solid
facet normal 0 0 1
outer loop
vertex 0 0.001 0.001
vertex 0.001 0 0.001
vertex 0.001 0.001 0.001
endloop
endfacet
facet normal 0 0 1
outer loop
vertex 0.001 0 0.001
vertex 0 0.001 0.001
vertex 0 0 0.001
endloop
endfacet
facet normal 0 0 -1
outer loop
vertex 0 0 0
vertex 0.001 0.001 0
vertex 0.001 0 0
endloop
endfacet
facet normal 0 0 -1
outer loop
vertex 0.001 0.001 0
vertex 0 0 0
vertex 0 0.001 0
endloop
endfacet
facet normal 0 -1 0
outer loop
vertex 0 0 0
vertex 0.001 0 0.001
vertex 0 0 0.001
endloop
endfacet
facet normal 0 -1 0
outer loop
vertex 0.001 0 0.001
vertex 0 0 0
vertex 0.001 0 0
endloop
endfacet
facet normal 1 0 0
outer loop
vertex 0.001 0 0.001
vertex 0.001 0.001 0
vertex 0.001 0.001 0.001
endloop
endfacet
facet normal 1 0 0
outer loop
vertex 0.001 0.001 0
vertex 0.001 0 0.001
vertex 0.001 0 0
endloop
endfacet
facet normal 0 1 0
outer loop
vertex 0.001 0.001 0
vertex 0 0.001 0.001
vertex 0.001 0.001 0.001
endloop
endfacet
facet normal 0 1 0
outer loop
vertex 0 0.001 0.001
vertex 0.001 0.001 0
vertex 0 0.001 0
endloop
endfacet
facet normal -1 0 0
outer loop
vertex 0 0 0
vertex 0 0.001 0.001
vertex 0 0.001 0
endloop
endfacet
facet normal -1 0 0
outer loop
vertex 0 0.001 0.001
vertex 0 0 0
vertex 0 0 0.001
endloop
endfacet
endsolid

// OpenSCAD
// Echoes the handful of derived numbers the probes need, one "PROBE name=value"
// line each, so the probes never re-derive geometry that params.scad owns.
include <../params.scad>
echo(str("PROBE slope=", pick_lid_slope));
echo(str("PROBE lid_dx=", (module_w - pick_lid_w) / 2));
echo(str("PROBE module_w=", module_w));
echo(str("PROBE module_d=", module_d));
echo(str("PROBE module_h=", module_h));
echo(str("PROBE lug_clear=", pick_lug_clear));
echo(str("PROBE lid_len=", pick_lid_len));
echo(str("PROBE lid_back_y=", yB_tray1 - pick_lid_clear));
echo(str("PROBE engage_asserted=", pick_lug_engage));
echo(str("PROBE rail_boss=", rail_boss));
echo(str("PROBE rail_skin=", rail_skin));
echo(str("PROBE rail1_y=", rail1_y));
echo(str("PROBE rail_out=", rail_out));
echo(str("PROBE rail_tip_w=", rail_tip_w));
echo(str("PROBE rail_clear=", rail_clear));
echo(str("PROBE rail1_soc_z1=", rail1_soc_z1));
echo(str("PROBE wall_out=", wall_out));
echo(str("PROBE pillar_w=", pillar_w));
echo(str("PROBE trayA_rim=", trayA_rim));
echo(str("PROBE trayB_rim=", trayB_rim));
echo(str("PROBE yA_tray0=", yA_tray0));
echo(str("PROBE yA_tray1=", yA_tray1));
echo(str("PROBE yB_tray0=", yB_tray0));
echo(str("PROBE yB_tray1=", yB_tray1));
echo(str("PROBE fill_seat_z=", fill_seat_z));
echo(str("PROBE bay_w=", bay_w));
echo(str("PROBE wall_div=", wall_div));
echo(str("PROBE module_h=", module_h));
echo(str("PROBE charge_ml=", charge_ml));
echo(str("PROBE trayA_pile_front=", trayA_pile_front));
echo(str("PROBE outletA_top=", outletA_top));
echo(str("PROBE z_foot=", z_foot));
echo(str("PROBE trayB_floor=", trayB_floor));
echo(str("PROBE trayA_front_h=", trayA_front_h));
echo(str("PROBE stop_y=", pick_stop_y));
echo(str("PROBE stop_back_y=", pick_stop_back_y));
echo(str("PROBE pick_stop_w=", pick_stop_w));
echo(str("PROBE mouth=", mouthA_min, " ", mouthA_corner_min, " ", mouthA_corner_pill, " ", mouthB_demonstrated, " ", mouthB_corner_demonstrated));
echo(str("PROBE fill_x=", wall_out + fill_lid_clear));
echo(str("PROBE fill_y=", hop_mouth_y0 + fill_lid_clear));
echo(str("PROBE fill_z=", fill_seat_z + fill_lid_seat_gap));
cube(0.001);
